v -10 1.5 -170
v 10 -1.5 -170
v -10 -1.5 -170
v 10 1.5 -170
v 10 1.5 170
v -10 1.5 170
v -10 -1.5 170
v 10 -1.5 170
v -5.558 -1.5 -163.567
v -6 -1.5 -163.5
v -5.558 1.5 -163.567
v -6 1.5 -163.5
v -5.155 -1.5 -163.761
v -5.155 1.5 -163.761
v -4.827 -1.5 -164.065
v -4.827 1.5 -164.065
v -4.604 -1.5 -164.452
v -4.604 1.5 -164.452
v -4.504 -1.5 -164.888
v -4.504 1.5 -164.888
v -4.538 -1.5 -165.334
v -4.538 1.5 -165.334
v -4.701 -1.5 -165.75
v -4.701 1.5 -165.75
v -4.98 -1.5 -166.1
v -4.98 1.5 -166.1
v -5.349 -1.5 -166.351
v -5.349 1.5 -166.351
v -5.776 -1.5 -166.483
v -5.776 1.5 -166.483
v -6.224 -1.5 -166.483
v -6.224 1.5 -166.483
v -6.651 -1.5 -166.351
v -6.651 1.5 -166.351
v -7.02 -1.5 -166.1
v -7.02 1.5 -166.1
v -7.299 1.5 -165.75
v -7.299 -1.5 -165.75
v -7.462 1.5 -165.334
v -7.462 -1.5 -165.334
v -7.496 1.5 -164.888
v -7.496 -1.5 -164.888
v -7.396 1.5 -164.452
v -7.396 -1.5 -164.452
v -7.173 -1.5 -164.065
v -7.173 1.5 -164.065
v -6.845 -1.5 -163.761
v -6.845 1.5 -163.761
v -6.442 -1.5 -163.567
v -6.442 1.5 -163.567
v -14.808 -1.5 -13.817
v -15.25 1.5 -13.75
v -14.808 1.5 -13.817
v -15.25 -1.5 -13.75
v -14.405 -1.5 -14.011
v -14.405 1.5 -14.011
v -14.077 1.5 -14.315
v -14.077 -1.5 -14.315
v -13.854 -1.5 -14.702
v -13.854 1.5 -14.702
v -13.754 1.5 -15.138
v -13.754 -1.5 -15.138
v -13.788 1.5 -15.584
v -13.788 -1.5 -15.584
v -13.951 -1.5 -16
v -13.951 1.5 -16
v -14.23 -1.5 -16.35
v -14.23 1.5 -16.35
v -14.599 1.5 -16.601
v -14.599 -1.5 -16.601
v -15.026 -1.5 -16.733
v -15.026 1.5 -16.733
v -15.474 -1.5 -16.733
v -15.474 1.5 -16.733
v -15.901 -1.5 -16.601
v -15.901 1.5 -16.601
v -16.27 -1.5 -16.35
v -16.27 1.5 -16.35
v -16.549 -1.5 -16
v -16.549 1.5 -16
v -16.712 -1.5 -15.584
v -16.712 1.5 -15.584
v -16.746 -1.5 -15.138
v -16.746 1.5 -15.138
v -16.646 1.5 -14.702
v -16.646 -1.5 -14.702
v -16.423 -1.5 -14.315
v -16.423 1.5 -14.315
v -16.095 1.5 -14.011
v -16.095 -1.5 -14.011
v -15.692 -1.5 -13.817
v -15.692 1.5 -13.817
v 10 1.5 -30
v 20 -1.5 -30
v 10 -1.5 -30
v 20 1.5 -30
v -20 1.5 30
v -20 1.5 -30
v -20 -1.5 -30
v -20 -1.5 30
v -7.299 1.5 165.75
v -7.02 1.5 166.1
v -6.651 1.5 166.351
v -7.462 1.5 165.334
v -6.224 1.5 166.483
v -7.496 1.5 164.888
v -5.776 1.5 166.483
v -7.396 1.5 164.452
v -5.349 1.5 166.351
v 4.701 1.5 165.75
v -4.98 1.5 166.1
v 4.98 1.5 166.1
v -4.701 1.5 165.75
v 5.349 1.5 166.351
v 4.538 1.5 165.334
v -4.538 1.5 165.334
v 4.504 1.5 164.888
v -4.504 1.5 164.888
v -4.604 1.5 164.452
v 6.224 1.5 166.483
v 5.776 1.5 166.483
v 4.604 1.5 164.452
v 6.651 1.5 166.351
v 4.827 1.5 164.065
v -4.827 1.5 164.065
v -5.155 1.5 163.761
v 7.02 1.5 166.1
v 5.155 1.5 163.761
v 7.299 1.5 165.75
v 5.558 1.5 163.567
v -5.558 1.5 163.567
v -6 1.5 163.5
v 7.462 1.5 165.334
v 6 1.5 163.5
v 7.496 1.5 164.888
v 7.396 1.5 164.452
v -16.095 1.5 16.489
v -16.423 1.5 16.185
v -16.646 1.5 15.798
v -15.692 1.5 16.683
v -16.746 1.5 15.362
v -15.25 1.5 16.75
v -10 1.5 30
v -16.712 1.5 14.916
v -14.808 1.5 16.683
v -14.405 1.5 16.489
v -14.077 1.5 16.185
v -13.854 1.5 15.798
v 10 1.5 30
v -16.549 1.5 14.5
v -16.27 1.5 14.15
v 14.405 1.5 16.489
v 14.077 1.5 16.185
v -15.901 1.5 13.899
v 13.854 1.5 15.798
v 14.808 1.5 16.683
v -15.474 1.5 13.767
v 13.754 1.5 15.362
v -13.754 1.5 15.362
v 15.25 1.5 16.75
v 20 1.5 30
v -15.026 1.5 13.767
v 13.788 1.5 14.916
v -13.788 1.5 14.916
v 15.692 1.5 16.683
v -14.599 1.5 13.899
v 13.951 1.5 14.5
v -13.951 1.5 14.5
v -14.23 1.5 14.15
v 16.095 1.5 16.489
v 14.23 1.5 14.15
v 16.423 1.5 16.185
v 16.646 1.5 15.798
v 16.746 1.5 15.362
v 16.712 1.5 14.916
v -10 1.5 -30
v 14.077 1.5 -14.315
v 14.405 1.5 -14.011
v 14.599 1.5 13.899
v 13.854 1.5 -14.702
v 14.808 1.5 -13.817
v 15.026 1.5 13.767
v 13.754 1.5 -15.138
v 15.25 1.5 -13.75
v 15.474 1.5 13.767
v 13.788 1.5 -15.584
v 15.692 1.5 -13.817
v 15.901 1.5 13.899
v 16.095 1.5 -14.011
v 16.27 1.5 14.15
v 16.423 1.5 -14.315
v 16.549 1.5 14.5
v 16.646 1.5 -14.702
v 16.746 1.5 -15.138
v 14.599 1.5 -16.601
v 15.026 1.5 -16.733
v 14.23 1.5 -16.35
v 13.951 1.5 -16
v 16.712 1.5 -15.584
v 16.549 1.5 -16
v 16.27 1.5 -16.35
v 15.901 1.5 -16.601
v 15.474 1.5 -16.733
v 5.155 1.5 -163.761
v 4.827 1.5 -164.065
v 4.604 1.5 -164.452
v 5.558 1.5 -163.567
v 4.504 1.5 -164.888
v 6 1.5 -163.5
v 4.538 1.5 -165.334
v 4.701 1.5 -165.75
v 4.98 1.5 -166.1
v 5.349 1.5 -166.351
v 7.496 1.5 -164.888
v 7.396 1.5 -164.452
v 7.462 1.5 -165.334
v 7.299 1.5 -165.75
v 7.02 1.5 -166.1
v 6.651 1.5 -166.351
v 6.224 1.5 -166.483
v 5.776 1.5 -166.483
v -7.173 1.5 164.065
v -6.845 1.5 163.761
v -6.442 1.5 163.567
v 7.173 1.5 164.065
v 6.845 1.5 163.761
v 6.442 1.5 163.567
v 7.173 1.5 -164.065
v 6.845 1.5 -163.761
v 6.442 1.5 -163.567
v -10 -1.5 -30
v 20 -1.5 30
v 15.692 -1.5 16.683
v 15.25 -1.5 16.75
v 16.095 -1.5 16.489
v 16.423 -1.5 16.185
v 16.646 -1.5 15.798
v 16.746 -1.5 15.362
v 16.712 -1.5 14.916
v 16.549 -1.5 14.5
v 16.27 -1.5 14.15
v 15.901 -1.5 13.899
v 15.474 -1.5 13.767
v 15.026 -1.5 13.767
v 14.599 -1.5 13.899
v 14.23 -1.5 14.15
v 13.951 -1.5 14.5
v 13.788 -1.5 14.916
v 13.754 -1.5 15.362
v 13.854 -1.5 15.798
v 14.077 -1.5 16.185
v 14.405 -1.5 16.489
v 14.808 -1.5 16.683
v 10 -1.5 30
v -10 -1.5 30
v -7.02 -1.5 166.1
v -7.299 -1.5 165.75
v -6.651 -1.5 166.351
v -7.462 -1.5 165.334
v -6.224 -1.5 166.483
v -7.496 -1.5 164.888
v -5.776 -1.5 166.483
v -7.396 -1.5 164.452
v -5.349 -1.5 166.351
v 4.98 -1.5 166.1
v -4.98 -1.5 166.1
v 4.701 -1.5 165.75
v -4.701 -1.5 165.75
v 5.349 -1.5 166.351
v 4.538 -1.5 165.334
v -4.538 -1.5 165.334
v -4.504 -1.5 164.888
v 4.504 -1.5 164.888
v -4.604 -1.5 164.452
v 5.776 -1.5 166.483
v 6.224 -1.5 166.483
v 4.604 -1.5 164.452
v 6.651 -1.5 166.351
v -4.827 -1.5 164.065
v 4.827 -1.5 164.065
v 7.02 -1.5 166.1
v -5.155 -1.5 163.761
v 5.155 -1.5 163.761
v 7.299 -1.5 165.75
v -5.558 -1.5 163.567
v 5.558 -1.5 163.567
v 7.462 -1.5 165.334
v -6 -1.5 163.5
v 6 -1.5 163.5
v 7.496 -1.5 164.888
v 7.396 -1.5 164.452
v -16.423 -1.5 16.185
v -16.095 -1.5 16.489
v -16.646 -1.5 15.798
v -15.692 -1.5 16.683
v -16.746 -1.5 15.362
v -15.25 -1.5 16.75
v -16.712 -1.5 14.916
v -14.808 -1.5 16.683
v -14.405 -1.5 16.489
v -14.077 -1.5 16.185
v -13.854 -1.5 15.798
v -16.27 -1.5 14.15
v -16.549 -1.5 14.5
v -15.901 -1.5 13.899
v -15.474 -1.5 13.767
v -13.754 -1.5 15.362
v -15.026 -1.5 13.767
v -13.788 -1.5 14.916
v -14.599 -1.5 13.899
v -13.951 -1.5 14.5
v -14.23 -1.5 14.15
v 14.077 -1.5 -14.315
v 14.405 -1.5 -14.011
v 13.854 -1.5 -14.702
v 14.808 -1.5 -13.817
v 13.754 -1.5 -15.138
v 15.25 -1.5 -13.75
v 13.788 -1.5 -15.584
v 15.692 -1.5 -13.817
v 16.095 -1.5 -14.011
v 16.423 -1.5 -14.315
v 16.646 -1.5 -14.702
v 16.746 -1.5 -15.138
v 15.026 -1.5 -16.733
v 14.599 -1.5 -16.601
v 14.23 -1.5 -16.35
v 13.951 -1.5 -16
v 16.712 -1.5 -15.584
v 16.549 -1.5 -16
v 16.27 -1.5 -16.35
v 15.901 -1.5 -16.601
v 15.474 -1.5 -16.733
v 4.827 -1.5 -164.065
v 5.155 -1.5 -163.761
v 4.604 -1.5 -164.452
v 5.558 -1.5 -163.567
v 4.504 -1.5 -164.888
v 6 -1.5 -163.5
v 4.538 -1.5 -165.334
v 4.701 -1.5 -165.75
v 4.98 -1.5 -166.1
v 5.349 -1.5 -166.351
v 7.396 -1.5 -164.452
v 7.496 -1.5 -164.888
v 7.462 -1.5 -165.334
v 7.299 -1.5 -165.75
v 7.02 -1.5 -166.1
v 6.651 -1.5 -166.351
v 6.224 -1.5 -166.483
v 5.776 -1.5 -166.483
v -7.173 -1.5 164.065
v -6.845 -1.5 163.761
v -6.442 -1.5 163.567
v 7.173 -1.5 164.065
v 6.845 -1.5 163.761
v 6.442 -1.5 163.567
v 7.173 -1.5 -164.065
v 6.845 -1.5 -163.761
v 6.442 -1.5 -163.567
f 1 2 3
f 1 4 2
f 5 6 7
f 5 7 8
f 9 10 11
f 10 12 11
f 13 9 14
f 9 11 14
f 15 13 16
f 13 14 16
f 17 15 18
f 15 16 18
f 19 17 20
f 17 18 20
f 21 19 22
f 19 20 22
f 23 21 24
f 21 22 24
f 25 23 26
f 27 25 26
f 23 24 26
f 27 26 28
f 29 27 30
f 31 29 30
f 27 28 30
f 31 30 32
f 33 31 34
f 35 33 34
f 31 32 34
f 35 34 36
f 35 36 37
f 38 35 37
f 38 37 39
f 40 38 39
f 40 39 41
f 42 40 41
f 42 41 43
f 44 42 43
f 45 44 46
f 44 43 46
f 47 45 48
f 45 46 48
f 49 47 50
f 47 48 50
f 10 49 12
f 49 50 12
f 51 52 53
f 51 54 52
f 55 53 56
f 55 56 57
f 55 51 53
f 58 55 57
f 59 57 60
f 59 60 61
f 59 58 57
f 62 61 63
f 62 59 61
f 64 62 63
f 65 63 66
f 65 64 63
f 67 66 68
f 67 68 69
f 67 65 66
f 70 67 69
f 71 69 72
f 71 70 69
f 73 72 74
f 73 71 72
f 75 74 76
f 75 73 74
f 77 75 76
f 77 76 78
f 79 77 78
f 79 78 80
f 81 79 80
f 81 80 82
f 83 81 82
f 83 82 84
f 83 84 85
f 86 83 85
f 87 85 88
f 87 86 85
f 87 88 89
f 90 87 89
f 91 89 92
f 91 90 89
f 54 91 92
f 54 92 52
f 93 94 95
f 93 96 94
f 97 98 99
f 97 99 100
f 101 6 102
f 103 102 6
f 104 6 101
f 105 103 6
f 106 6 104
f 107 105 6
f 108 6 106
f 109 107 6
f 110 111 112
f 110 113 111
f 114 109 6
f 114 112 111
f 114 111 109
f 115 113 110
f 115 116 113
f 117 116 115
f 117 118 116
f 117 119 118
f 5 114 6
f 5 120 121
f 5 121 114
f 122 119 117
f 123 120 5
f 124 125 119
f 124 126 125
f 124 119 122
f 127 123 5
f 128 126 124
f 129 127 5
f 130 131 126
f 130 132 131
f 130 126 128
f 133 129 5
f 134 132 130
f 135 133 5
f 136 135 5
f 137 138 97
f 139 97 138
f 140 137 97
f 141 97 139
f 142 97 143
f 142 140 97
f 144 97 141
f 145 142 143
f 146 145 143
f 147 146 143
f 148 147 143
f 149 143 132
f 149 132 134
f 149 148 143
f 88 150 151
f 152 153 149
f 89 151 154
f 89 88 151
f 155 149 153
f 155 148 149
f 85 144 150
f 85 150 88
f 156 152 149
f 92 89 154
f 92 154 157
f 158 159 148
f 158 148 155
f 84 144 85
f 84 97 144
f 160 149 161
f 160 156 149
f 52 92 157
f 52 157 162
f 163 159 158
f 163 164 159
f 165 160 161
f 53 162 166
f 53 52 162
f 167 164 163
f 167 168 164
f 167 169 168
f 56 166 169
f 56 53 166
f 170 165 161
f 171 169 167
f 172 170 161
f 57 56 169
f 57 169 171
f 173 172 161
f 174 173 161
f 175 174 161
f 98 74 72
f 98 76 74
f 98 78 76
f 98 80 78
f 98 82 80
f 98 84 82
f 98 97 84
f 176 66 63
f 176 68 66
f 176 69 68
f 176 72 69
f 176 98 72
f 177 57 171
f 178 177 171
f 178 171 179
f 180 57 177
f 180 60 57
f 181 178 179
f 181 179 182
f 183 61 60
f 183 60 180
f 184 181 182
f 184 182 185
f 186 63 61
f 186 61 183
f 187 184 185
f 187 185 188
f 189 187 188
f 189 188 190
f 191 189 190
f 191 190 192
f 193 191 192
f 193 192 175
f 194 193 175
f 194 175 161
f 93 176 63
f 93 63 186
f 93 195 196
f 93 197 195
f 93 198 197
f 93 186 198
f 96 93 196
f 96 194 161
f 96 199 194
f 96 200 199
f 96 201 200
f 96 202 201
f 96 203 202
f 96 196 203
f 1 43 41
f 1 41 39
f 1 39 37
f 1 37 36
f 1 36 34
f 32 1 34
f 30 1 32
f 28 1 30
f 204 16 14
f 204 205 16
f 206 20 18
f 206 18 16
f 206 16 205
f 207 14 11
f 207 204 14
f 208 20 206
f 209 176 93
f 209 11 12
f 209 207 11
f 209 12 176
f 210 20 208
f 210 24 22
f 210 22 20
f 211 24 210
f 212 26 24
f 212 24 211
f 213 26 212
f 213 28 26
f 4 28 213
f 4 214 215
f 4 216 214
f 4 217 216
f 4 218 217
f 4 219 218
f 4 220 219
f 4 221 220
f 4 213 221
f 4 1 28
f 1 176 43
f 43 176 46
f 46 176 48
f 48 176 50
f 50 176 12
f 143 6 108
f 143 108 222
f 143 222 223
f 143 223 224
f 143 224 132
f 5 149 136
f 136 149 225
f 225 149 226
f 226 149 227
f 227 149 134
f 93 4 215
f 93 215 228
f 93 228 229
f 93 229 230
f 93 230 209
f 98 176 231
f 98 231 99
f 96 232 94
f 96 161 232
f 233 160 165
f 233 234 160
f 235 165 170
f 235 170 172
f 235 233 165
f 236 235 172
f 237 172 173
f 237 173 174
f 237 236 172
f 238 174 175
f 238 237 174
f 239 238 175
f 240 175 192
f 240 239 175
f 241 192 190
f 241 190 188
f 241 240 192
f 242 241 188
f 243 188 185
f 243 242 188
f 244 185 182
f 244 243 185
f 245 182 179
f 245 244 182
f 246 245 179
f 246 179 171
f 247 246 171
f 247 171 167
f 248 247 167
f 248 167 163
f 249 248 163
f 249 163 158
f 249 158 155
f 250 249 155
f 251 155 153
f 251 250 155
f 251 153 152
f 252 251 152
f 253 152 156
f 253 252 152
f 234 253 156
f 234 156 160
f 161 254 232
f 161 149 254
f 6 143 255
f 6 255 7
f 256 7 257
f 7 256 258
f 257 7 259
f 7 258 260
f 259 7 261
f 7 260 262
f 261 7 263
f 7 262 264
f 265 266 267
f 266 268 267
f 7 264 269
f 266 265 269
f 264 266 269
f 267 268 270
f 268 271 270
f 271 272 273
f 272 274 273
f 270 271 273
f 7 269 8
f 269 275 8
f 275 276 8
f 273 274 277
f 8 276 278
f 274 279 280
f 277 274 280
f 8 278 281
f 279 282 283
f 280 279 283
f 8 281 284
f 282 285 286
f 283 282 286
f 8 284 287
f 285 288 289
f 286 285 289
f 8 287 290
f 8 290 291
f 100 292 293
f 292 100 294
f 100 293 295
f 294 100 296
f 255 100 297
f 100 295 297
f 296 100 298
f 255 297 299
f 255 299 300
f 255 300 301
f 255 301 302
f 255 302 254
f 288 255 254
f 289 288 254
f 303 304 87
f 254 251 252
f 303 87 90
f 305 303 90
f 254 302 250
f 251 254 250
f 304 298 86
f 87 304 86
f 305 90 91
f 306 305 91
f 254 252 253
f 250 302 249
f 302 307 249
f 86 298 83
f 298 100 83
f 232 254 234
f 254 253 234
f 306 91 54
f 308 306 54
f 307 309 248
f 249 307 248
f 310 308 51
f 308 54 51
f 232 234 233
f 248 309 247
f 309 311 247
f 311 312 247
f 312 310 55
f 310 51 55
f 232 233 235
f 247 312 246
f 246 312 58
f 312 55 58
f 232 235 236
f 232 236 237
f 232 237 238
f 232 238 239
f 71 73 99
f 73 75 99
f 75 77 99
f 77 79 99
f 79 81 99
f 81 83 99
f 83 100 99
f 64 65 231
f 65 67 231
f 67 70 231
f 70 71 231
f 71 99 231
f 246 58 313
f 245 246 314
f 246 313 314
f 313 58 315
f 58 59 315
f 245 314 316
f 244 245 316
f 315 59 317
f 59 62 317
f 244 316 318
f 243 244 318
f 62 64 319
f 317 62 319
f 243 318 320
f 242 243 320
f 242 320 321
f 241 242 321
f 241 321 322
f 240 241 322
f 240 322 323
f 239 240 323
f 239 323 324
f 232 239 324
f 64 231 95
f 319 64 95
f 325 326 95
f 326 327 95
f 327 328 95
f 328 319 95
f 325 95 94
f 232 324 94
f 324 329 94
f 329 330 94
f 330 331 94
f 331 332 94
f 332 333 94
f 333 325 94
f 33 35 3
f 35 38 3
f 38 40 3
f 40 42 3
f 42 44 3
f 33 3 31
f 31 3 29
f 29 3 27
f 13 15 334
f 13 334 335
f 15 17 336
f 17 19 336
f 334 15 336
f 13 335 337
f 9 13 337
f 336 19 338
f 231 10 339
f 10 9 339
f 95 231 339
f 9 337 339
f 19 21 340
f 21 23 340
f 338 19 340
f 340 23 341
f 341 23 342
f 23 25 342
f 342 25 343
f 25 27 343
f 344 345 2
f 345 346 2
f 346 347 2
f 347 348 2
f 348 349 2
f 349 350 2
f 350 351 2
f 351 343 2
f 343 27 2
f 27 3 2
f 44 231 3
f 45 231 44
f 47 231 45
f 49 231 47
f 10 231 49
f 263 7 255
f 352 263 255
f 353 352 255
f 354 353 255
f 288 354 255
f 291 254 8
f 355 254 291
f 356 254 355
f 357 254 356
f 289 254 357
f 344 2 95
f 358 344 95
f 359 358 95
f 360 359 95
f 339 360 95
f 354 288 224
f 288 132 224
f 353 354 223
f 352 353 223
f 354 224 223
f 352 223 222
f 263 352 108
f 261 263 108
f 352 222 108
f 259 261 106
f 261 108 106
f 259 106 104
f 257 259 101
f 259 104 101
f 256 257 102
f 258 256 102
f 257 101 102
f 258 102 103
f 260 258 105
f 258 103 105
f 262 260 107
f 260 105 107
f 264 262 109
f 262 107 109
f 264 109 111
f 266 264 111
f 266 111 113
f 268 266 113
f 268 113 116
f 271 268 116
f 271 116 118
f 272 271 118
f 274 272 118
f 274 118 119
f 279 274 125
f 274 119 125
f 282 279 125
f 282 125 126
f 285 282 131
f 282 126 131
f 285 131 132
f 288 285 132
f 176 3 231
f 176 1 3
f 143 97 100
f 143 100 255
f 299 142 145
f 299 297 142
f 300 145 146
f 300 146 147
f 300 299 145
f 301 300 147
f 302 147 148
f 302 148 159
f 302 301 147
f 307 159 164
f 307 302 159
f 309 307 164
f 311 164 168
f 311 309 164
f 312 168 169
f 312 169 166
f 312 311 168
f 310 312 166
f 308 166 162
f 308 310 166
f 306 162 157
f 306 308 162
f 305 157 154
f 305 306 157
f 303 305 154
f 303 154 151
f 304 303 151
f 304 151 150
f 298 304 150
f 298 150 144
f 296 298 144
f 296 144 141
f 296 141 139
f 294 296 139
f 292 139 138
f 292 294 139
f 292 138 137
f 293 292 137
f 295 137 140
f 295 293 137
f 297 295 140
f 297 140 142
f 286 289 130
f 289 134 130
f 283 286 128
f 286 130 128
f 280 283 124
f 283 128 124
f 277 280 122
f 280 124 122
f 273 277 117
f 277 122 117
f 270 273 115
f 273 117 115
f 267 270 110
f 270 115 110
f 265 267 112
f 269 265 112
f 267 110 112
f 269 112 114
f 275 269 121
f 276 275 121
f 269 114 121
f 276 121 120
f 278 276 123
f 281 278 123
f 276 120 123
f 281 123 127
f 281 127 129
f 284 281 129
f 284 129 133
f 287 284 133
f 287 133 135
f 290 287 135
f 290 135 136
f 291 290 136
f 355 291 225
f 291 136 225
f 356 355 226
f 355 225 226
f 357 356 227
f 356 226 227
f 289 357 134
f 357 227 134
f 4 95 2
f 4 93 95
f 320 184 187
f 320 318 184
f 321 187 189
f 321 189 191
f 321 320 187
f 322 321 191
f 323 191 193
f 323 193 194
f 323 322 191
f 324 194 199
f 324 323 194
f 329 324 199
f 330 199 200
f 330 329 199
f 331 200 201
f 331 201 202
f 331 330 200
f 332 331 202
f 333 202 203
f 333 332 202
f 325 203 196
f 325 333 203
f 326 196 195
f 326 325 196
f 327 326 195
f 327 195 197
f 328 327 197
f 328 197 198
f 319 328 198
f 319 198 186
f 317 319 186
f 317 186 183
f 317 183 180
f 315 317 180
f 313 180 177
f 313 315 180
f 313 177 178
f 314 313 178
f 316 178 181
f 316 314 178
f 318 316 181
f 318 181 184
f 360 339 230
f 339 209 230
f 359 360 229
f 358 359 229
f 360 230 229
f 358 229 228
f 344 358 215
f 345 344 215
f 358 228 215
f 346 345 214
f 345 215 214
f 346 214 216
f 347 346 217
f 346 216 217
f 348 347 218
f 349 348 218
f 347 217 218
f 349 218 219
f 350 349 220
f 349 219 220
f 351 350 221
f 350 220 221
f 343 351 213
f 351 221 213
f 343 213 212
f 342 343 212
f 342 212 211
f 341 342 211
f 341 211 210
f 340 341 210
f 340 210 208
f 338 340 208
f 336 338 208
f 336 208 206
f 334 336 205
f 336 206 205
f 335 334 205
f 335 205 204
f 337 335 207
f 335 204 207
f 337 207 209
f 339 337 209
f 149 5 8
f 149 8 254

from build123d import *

# Parameters (mm, degrees)
SKETCH1_R            = 1.5
BOSS_EXTRUDE1_DEPTH  = 1.5
SKETCH2_R            = 1.5
CONNECTOR0HOLE_DEPTH = 172.17899988
CIRPATTERN1_COUNT    = 2


with BuildPart() as part:
    # Sketch1 → Boss-Extrude1 (new, symmetric)
    with BuildSketch(Plane(origin=(0, 0, 0), x_dir=(1, 0, 0), z_dir=(0, 1, 0))):
        Polygon((-10, 170), (-10, 30), (-20, 30), (-20, -30), (-10, -30), (-10, -170), (10, -170), (10, -30), (20, -30), (20, 30), (10, 30), (10, 170), align=None)
        with Locations((-15.25, 15.25)):
            Circle(SKETCH1_R, mode=Mode.SUBTRACT)
        with Locations((15.25, 15.25)):
            Circle(SKETCH1_R, mode=Mode.SUBTRACT)
        with Locations((15.25, -15.25)):
            Circle(SKETCH1_R, mode=Mode.SUBTRACT)
        with Locations((-15.25, -15.25)):
            Circle(SKETCH1_R, mode=Mode.SUBTRACT)
    extrude(amount=BOSS_EXTRUDE1_DEPTH, both=True)

    # Sketch2 → connector0hole (cut, symmetric)
    with BuildSketch(Plane(origin=(0, 0, 0), x_dir=(1, 0, 0), z_dir=(0, 1, 0))):
        with Locations((-6, 165)):
            Circle(SKETCH2_R)
        with Locations((6, 165)):
            Circle(SKETCH2_R)
    connector0hole = extrude(amount=CONNECTOR0HOLE_DEPTH, both=True, mode=Mode.SUBTRACT)

    # CirPattern1: connector0hole ×2 about axis
    cirpattern1_axis = Axis((0, 177.495542011, 0), (0, -1, 0))
    for i in range(1, CIRPATTERN1_COUNT):
        add(connector0hole.rotate(cirpattern1_axis, i * 360 / CIRPATTERN1_COUNT), mode=Mode.SUBTRACT)


solid = part.part
